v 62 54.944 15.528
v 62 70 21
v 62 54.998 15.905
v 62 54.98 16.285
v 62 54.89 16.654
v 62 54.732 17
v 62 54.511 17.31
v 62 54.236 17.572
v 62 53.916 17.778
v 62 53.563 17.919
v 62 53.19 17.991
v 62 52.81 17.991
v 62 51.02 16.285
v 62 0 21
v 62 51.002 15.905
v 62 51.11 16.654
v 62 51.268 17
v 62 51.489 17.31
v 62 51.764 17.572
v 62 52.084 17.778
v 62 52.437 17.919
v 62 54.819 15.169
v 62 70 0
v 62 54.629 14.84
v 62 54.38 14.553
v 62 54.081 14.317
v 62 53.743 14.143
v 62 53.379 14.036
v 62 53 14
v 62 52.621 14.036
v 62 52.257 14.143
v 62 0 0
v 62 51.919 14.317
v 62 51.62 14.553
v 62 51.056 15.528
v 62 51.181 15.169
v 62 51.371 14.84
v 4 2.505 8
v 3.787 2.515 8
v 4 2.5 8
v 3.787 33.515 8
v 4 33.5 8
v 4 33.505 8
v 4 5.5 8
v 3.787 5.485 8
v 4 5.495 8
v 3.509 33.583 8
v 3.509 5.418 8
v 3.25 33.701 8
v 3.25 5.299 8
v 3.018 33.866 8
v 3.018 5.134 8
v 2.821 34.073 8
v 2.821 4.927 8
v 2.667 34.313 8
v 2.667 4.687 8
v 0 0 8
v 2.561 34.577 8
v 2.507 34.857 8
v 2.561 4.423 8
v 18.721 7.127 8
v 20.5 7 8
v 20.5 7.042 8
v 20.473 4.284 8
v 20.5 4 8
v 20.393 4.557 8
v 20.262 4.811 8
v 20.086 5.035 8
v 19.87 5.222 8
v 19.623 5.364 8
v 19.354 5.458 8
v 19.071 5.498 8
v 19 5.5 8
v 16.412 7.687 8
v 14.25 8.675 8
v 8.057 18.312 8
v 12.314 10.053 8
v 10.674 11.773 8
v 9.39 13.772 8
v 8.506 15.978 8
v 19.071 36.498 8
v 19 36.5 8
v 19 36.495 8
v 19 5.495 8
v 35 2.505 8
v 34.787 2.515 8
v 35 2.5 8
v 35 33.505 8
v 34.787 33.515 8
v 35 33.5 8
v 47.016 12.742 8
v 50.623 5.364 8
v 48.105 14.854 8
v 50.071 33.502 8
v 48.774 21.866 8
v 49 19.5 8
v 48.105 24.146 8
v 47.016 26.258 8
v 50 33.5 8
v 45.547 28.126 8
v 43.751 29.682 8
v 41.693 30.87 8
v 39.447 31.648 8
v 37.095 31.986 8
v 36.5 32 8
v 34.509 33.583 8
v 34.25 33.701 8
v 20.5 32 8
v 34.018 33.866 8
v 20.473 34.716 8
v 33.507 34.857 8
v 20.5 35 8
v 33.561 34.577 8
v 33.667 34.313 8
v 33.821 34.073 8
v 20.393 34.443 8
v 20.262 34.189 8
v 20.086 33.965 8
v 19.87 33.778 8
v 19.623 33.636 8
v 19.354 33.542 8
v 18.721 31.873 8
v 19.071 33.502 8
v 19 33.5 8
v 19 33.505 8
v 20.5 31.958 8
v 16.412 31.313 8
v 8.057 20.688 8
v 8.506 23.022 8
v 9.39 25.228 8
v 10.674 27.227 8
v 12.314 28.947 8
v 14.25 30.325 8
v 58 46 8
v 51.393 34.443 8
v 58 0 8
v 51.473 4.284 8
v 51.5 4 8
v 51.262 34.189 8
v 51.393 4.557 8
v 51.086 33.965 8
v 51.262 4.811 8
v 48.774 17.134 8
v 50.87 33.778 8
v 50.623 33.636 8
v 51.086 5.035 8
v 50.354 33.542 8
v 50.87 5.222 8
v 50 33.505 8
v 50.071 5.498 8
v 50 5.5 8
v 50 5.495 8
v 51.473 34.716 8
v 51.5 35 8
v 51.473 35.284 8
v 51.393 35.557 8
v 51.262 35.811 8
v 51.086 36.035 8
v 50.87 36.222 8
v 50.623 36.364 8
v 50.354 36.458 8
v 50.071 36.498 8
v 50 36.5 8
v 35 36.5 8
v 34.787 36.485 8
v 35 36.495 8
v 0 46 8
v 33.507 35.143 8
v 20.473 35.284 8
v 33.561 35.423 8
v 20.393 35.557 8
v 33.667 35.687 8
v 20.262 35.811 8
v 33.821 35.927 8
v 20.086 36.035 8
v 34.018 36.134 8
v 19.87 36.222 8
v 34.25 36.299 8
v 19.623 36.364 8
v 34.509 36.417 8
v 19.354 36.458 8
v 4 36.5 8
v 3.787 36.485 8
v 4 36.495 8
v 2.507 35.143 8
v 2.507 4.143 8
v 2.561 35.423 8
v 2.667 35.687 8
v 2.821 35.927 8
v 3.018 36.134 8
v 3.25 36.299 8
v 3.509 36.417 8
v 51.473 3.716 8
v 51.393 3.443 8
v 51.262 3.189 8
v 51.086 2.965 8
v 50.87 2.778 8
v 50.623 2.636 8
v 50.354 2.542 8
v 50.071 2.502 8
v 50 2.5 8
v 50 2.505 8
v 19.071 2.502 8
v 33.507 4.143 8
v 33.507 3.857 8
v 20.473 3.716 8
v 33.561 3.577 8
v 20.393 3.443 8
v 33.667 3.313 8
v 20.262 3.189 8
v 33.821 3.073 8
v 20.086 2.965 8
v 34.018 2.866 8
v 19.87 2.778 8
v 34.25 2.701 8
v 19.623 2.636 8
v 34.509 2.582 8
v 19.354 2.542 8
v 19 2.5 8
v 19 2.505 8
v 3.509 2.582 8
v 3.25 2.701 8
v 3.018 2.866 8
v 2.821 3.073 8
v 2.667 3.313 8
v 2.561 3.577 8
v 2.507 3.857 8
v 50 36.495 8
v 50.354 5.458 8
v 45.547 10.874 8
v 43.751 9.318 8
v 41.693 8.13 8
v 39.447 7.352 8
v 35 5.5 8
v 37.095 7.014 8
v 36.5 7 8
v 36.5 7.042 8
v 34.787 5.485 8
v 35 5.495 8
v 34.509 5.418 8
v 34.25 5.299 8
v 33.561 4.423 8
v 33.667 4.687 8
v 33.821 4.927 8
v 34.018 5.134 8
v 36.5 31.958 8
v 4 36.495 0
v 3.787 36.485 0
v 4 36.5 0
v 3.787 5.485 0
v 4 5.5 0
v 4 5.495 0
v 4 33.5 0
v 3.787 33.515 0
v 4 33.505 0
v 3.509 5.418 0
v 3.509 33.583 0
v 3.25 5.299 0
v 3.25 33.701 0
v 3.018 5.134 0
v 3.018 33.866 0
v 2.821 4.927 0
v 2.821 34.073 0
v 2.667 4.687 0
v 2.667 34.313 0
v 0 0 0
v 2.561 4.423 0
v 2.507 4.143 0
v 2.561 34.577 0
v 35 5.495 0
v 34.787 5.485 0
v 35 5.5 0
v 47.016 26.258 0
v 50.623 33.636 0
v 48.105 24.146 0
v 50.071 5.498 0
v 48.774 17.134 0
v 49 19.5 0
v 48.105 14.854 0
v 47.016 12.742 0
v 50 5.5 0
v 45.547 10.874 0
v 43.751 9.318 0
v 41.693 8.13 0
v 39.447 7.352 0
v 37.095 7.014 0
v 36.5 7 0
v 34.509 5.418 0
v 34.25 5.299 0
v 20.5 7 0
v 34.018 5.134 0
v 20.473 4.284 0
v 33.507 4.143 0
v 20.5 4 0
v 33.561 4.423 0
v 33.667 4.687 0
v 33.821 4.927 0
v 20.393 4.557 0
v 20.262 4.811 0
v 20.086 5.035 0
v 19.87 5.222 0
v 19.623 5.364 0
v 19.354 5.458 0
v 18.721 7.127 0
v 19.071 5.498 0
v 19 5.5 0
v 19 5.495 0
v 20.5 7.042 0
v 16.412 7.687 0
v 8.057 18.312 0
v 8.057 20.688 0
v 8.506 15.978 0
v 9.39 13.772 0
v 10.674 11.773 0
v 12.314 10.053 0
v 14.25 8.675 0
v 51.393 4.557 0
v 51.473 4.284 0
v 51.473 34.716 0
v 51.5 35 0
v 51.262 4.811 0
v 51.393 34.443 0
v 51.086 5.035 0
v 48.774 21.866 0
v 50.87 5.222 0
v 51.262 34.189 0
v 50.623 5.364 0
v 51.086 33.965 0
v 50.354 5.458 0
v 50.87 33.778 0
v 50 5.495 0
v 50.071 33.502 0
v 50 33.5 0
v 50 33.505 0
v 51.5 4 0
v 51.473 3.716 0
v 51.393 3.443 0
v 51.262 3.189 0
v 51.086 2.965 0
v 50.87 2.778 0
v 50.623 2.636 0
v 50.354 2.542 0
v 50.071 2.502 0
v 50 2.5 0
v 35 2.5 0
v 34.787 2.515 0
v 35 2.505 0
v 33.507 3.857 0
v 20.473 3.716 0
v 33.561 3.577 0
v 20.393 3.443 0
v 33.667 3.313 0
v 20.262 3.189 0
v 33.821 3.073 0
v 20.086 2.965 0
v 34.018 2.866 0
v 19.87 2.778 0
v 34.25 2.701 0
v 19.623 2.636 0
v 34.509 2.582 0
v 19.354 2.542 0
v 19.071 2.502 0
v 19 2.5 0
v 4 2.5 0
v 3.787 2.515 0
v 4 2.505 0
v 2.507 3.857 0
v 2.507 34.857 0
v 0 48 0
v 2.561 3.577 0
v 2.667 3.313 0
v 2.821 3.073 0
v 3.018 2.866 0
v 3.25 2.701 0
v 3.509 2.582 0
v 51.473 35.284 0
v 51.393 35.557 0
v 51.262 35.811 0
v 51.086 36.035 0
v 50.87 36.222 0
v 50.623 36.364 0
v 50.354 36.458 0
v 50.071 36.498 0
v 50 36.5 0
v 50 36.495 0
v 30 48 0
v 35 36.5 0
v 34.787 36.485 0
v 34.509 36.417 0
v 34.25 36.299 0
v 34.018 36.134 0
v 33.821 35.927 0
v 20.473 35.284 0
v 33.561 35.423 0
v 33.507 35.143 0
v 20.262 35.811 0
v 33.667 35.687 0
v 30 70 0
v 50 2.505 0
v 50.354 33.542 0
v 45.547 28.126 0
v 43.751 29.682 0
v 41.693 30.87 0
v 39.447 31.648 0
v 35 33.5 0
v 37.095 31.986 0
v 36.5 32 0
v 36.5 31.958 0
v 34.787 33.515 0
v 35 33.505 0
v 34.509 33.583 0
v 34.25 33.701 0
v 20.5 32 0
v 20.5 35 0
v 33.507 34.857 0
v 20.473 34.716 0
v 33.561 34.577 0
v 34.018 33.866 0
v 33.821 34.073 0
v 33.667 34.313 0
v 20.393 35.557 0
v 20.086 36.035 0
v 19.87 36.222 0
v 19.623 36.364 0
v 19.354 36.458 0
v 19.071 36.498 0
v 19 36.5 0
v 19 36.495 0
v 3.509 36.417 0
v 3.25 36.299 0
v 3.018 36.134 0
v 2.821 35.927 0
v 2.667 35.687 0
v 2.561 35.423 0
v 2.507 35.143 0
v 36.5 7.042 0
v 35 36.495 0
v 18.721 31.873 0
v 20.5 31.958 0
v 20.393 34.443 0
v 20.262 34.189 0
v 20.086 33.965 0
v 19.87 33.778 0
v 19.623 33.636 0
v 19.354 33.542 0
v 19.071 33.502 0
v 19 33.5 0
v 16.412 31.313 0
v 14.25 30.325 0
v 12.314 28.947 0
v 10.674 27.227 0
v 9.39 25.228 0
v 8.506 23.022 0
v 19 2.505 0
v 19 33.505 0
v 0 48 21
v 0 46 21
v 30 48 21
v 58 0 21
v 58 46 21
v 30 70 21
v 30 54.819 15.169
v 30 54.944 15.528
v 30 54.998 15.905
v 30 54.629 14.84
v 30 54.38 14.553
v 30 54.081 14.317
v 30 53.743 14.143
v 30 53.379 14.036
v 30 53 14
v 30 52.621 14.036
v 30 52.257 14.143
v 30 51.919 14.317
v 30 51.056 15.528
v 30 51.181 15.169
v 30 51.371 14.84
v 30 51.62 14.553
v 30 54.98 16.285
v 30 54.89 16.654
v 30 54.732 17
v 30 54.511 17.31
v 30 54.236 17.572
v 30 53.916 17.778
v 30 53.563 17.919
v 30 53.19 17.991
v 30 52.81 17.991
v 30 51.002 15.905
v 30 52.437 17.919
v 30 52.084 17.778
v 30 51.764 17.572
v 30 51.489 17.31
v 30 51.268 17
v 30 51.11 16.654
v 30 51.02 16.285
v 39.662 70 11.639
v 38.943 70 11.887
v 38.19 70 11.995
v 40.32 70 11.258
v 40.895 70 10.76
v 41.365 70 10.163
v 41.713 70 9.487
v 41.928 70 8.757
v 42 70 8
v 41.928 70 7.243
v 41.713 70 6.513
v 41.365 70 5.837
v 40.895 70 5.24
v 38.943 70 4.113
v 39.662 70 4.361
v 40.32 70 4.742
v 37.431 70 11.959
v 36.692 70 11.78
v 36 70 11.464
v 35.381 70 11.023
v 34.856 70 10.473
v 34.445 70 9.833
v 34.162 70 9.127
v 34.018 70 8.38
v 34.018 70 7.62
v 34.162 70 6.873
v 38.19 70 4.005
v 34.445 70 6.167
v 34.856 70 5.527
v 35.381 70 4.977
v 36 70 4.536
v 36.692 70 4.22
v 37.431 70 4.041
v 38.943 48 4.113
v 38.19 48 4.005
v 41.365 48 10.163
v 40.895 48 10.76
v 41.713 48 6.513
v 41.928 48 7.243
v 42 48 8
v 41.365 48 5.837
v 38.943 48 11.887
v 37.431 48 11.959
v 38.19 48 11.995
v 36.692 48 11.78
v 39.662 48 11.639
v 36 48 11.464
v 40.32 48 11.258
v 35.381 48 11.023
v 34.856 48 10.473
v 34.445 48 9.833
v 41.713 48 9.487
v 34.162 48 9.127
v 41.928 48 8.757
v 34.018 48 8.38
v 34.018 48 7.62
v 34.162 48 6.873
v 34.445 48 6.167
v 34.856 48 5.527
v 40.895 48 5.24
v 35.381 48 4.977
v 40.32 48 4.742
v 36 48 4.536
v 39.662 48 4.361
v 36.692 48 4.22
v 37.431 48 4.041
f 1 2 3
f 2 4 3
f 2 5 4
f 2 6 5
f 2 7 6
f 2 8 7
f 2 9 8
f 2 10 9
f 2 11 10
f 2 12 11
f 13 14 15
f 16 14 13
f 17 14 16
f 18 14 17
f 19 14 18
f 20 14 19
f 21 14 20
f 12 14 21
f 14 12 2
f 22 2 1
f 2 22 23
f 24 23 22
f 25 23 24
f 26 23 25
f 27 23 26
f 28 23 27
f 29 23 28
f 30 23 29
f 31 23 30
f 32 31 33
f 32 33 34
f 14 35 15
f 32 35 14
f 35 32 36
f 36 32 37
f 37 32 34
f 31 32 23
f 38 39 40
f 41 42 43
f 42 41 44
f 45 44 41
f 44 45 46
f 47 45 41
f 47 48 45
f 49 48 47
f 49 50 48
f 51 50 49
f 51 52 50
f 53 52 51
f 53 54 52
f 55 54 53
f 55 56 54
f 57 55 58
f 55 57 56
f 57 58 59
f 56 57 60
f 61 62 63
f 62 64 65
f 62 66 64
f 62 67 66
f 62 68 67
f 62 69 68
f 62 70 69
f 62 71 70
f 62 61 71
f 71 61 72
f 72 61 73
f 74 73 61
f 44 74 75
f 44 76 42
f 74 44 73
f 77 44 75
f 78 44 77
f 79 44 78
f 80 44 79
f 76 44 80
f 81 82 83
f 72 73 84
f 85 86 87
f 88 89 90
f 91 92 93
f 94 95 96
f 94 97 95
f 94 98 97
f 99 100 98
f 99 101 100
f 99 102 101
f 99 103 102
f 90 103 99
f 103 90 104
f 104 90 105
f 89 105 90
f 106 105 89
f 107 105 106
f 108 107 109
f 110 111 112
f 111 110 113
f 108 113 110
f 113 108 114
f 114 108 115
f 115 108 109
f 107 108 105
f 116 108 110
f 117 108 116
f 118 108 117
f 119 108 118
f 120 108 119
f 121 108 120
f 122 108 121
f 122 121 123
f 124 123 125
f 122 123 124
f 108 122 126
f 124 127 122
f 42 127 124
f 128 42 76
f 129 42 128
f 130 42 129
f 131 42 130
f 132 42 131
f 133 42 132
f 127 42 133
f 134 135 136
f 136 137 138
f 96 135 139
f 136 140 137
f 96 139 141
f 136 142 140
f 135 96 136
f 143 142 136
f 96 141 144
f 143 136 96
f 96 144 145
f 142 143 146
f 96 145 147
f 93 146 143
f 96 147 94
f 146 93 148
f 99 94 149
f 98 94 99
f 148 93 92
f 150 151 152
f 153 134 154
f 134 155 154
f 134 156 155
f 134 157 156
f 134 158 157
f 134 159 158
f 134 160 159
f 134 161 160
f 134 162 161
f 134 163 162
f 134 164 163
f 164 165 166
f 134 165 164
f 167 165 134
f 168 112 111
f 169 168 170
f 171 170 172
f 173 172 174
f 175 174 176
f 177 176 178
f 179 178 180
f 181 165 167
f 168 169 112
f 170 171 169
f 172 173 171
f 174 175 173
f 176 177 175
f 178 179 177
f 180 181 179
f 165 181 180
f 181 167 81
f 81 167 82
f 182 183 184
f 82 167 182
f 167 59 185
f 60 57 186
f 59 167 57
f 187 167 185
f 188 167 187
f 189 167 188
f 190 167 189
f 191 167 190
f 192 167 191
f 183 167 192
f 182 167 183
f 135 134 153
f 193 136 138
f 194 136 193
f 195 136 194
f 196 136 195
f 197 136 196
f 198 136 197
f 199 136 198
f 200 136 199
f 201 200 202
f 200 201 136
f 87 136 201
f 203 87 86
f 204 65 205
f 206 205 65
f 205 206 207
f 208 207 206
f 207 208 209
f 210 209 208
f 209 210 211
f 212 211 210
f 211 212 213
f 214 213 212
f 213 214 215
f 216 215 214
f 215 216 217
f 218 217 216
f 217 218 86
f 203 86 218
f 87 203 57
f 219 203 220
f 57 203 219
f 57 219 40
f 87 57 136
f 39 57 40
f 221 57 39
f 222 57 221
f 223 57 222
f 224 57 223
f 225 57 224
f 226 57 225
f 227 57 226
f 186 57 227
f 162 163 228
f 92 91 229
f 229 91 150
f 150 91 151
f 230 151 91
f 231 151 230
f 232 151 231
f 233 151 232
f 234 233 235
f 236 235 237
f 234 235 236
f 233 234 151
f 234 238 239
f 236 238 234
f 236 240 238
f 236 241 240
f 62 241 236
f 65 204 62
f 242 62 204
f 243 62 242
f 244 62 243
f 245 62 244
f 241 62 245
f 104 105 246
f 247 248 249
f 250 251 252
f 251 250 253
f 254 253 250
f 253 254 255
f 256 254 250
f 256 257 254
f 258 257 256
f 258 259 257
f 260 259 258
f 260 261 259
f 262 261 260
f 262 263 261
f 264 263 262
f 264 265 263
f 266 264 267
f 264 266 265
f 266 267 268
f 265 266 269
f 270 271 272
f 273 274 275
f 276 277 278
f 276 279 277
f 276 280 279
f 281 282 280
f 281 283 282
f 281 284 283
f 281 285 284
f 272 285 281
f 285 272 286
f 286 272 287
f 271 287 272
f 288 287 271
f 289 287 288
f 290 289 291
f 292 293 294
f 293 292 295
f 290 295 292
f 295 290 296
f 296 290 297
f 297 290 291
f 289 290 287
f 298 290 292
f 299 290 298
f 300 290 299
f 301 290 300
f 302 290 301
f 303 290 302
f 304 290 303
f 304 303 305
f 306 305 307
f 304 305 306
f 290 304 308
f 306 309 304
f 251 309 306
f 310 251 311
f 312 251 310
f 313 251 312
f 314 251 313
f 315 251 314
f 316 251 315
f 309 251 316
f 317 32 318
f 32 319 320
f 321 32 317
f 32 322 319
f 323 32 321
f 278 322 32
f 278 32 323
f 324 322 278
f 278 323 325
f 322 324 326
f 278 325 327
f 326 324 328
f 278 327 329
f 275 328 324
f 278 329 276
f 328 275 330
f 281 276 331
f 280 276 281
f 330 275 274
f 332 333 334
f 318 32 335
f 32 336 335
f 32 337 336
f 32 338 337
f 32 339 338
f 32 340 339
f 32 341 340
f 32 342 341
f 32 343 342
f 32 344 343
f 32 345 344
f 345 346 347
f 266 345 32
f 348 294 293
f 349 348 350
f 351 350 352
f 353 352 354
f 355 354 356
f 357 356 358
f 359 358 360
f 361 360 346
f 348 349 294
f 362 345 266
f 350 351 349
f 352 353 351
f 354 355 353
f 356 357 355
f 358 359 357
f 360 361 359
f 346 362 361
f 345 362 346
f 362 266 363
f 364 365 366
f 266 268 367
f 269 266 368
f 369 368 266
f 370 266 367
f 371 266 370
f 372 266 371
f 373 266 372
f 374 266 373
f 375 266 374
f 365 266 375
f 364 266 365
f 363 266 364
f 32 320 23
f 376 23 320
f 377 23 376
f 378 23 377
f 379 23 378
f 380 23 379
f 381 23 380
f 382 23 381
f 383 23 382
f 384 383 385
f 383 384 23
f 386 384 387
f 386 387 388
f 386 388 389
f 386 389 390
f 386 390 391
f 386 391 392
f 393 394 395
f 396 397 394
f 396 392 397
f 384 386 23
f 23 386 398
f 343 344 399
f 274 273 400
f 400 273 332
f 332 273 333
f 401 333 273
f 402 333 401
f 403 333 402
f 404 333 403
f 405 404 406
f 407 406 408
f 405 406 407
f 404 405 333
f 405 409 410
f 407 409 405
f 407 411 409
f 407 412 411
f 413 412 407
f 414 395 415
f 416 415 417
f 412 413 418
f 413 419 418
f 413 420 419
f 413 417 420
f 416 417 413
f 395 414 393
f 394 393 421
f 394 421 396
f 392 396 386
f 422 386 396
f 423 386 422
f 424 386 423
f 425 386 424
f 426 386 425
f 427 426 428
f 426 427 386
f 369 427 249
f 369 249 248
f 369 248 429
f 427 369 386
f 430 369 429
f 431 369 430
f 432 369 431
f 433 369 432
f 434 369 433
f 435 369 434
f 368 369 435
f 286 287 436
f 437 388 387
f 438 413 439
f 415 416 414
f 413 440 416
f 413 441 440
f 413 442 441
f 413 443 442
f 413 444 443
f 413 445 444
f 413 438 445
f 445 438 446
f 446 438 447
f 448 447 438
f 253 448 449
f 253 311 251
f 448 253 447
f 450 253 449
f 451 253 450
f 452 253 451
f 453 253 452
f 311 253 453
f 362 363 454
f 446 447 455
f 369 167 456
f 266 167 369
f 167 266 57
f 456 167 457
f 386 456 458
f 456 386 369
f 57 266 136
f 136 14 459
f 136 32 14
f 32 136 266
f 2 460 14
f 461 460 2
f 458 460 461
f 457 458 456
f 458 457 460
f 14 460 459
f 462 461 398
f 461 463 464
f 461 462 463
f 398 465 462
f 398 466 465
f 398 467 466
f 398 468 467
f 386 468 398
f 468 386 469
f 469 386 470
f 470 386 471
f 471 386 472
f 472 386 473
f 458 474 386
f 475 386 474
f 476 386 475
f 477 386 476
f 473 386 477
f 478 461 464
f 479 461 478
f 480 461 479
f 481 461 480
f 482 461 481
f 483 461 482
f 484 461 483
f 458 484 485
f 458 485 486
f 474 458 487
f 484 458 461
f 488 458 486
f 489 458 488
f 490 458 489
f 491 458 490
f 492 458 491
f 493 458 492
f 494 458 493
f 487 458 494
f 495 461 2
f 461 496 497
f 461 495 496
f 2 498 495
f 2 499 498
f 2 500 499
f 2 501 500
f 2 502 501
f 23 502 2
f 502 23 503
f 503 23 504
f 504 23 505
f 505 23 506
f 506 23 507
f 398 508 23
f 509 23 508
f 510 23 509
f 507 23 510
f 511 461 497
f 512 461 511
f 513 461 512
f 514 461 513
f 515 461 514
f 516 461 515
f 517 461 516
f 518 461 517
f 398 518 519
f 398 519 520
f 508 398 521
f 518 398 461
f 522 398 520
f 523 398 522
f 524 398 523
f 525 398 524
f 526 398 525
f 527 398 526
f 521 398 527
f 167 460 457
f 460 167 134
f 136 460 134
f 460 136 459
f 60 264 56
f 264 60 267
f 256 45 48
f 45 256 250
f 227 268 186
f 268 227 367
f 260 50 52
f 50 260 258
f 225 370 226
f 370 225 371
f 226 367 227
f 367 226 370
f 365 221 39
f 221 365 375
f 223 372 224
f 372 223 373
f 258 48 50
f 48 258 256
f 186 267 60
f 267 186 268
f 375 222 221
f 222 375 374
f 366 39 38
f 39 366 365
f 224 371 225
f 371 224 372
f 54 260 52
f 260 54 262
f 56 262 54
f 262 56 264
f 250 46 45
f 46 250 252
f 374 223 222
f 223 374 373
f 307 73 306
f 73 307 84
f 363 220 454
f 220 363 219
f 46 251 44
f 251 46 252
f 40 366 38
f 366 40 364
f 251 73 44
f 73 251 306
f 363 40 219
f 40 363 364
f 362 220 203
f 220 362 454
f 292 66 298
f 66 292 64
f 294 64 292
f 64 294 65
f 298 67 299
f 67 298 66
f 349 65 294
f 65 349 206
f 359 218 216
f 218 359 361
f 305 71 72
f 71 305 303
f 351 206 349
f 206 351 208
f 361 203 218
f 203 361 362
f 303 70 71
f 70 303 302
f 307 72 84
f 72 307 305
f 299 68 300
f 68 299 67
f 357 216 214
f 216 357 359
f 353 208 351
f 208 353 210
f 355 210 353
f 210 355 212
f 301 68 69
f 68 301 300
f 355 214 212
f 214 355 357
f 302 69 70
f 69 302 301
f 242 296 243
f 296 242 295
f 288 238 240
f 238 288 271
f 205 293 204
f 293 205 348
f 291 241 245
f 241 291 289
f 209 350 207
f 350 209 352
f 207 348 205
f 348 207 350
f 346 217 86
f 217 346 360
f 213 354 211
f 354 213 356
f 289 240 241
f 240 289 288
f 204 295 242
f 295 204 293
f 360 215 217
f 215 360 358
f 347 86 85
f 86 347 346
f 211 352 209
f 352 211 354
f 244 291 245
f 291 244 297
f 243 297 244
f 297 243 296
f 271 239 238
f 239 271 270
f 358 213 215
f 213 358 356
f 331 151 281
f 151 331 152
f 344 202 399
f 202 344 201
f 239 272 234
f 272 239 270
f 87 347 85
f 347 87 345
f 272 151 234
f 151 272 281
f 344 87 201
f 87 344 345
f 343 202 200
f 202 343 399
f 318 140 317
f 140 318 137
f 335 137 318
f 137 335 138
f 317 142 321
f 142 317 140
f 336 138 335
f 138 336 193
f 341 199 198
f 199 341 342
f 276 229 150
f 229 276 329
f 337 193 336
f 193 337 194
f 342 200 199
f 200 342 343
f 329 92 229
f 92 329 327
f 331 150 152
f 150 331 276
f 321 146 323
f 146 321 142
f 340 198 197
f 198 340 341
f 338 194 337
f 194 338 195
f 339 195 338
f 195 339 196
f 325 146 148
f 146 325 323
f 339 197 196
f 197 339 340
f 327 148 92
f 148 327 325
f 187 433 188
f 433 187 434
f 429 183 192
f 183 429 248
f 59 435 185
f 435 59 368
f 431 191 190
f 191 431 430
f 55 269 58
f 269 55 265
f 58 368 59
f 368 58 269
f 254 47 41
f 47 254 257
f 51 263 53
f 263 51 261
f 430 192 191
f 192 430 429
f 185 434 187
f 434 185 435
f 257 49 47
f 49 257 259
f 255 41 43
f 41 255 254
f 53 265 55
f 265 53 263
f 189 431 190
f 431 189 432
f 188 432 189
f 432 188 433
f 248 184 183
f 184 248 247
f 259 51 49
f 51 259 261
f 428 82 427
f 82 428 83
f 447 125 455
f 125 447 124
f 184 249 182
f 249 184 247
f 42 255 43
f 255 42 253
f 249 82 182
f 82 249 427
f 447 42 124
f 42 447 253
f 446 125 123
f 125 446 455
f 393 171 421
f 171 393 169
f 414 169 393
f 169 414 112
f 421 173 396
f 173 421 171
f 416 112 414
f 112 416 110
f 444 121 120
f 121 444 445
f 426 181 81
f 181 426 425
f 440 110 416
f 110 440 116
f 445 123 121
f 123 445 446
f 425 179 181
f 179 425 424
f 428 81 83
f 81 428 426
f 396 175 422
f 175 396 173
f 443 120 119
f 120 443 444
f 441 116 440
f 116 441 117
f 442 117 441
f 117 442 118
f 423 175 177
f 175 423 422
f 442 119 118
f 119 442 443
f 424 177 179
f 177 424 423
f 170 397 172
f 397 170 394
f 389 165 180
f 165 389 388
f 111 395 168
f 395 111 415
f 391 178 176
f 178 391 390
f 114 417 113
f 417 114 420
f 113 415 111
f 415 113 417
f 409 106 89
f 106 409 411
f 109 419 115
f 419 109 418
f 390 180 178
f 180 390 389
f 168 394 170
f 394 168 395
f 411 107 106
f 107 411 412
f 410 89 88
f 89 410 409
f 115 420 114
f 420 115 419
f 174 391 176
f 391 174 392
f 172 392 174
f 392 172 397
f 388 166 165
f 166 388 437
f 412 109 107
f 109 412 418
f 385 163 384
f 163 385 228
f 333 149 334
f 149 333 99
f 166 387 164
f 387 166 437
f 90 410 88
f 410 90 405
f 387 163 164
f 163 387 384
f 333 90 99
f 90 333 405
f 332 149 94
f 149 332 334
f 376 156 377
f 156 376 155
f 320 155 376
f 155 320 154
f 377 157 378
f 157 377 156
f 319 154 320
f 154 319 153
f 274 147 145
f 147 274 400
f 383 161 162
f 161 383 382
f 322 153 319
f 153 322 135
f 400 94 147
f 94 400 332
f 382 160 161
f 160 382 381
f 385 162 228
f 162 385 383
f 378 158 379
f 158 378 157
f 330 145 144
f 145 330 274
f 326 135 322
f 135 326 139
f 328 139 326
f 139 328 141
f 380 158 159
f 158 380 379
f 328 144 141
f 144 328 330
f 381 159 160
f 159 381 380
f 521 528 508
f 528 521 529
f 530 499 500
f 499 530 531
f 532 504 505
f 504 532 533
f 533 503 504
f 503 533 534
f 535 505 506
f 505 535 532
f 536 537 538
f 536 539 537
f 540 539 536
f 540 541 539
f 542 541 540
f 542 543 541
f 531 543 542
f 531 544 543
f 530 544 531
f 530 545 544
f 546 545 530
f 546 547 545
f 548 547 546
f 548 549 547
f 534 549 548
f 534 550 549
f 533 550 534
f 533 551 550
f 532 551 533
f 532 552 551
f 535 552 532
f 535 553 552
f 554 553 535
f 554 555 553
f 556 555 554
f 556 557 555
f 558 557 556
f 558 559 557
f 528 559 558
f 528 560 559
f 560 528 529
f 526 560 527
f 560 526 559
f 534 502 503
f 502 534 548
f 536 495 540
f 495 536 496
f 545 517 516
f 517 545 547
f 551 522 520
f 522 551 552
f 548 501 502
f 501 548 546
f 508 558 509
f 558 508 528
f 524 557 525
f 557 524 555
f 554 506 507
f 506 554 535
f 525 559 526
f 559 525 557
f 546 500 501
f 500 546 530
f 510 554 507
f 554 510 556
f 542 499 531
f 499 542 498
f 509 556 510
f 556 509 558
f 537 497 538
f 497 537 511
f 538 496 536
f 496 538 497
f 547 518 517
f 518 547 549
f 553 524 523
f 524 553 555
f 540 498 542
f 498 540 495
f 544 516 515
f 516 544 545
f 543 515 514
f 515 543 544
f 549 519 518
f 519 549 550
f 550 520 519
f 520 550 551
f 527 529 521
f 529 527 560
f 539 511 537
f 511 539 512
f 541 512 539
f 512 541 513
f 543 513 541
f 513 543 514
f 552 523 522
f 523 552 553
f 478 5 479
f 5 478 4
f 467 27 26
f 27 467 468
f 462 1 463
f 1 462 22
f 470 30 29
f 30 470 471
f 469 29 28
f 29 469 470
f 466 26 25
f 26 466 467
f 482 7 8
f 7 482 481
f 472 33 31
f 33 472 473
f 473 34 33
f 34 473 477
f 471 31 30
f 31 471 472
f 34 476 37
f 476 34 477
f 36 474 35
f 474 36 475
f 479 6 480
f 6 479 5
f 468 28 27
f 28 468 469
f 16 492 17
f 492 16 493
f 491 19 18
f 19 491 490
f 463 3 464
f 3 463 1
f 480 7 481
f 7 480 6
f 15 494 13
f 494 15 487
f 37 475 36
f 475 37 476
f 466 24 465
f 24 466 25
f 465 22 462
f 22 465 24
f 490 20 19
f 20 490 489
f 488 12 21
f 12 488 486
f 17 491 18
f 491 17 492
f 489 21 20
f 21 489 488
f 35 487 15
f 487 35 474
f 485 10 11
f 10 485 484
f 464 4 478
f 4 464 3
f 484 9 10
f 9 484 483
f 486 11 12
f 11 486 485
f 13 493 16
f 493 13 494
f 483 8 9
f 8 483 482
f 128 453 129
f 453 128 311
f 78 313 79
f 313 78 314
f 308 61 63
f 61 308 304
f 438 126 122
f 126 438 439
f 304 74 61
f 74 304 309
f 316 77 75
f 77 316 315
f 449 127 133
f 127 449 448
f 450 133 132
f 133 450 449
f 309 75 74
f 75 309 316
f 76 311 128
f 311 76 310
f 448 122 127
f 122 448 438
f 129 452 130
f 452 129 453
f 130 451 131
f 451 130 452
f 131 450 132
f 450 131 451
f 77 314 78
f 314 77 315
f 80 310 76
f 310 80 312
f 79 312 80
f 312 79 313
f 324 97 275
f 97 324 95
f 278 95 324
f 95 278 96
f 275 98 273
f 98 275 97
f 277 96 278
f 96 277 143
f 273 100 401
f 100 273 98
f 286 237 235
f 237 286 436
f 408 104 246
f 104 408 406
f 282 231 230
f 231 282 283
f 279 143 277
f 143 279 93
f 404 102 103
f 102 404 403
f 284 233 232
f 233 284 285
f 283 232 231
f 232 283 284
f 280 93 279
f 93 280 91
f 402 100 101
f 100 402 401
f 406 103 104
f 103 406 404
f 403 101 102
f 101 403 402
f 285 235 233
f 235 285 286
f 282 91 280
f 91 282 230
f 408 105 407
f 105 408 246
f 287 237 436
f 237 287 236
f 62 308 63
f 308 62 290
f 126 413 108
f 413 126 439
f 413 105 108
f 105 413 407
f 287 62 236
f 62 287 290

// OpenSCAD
// file: configuration.scad
// Copyright (C) 2012 t00tie
// Adapto is licensed under the Creative Commons - GNU GPL license.
// http://creativecommons.org/licenses/GPL/2.0/

// Configuration file for Adapto OpenSCAD files

boltOuterRadius=5/2;// outer radius of bolt threads, 5 for M5 bolts
boltLength=60;//bolt length without head (threaded part only)
washerOuterRadius=13/2;// washers that fit the bolts
washerLength=10;// this is large because it is used to make holes for washers

frameX=20;// width of frame parts (alu, wood etc.)
frameY=20;// ditto

boltOffset=frameX/2;// How far in the bolt holes go, may need tweaking if framX!=frameY

smoothRod=8;// diameter of smooth rods
// file: bolt.scad
include <configuration.scad>;

module bolt(){
	union(){
		translate([0, 0, -boltLength]) cylinder(r=boltOuterRadius, h=boltLength+1);
		cylinder(r=washerOuterRadius, h=washerLength);
	}
}

// a bolt and washer intended for making equivalent holes
// the parameter from indicates which side the bolt is inserted from
module boltWasher(from="x-"){
	if(from=="x+"){
		rotate([0, 90, 0]) bolt();
	} else
	if(from=="x-"){
		rotate([0, -90, 0]) bolt();
	} else
	if(from=="y+"){
		rotate([-90, 0, 0]) bolt();
	} else
	if(from=="y-"){
		rotate([90, 0, 0]) bolt();
	} else
	if(from=="z+"){
		rotate([0, 0, 0]) bolt();
	} else
	if(from=="z-"){
		rotate([180, 0, 0]) bolt();
	}
}

boltWasher("x-");
// main file
// Copyright (C) 2012 t00tie
// After an stl designed by RoTorIT
// Adapto is licensed under the Creative Commons - GNU GPL license.
// http://creativecommons.org/licenses/GPL/2.0/


use <bolt.scad>;
include <configuration.scad>;

$fn=33;
m8rodr=8/2;
m4rodr=4/2;
m3rodr=3/2;
motorcc=31;// centre-centre of the motor screw holes for nema17
centerr=25/2;// radius of the centre holes

difference(){
	union(){
		cube([62, 48, 8]);
		translate([30, 48, 0]) cube([32, 22, 21]);
		translate([0, 48-2, 0]) cube([62, 2, 21]);
		translate([58, 0, 0]) cube([4, 48, 21]);
	}
	translate([34+m8rodr, 48, 4+m8rodr]) rotate([-90,0,0]) cylinder(r=m8rodr, h=24+1);
	translate([30-1, 51+m4rodr, 14+m4rodr]) rotate([0,90,0]) cylinder(r=m4rodr, h=32+1+1);
	translate([8+centerr, 4+2*m3rodr+centerr, -1]) cylinder(r=centerr, h=8+2);
	translate([8+centerr+motorcc-(18-2*m3rodr), 4+2*m3rodr+centerr, -1]) cylinder(r=centerr, h=8+2);
	translate([8+centerr, 4+2*m3rodr, -1]) cube([motorcc-(18-2*m3rodr), 2*centerr, 8+2]);
	translate([4, 4, -1]) oval();
	translate([4+motorcc, 4, -1]) oval();
	translate([4, 4+motorcc, -1]) oval();
	translate([4+motorcc, 4+motorcc, -1]) oval();

}

module oval(){
	cylinder(r=m3rodr, h=8+2);
	translate([0, -m3rodr, 0]) cube([18-2*m3rodr, 2*m3rodr, 8+2]);
	translate([18-2*m3rodr, 0, 0]) cylinder(r=m3rodr, h=8+2);
}
